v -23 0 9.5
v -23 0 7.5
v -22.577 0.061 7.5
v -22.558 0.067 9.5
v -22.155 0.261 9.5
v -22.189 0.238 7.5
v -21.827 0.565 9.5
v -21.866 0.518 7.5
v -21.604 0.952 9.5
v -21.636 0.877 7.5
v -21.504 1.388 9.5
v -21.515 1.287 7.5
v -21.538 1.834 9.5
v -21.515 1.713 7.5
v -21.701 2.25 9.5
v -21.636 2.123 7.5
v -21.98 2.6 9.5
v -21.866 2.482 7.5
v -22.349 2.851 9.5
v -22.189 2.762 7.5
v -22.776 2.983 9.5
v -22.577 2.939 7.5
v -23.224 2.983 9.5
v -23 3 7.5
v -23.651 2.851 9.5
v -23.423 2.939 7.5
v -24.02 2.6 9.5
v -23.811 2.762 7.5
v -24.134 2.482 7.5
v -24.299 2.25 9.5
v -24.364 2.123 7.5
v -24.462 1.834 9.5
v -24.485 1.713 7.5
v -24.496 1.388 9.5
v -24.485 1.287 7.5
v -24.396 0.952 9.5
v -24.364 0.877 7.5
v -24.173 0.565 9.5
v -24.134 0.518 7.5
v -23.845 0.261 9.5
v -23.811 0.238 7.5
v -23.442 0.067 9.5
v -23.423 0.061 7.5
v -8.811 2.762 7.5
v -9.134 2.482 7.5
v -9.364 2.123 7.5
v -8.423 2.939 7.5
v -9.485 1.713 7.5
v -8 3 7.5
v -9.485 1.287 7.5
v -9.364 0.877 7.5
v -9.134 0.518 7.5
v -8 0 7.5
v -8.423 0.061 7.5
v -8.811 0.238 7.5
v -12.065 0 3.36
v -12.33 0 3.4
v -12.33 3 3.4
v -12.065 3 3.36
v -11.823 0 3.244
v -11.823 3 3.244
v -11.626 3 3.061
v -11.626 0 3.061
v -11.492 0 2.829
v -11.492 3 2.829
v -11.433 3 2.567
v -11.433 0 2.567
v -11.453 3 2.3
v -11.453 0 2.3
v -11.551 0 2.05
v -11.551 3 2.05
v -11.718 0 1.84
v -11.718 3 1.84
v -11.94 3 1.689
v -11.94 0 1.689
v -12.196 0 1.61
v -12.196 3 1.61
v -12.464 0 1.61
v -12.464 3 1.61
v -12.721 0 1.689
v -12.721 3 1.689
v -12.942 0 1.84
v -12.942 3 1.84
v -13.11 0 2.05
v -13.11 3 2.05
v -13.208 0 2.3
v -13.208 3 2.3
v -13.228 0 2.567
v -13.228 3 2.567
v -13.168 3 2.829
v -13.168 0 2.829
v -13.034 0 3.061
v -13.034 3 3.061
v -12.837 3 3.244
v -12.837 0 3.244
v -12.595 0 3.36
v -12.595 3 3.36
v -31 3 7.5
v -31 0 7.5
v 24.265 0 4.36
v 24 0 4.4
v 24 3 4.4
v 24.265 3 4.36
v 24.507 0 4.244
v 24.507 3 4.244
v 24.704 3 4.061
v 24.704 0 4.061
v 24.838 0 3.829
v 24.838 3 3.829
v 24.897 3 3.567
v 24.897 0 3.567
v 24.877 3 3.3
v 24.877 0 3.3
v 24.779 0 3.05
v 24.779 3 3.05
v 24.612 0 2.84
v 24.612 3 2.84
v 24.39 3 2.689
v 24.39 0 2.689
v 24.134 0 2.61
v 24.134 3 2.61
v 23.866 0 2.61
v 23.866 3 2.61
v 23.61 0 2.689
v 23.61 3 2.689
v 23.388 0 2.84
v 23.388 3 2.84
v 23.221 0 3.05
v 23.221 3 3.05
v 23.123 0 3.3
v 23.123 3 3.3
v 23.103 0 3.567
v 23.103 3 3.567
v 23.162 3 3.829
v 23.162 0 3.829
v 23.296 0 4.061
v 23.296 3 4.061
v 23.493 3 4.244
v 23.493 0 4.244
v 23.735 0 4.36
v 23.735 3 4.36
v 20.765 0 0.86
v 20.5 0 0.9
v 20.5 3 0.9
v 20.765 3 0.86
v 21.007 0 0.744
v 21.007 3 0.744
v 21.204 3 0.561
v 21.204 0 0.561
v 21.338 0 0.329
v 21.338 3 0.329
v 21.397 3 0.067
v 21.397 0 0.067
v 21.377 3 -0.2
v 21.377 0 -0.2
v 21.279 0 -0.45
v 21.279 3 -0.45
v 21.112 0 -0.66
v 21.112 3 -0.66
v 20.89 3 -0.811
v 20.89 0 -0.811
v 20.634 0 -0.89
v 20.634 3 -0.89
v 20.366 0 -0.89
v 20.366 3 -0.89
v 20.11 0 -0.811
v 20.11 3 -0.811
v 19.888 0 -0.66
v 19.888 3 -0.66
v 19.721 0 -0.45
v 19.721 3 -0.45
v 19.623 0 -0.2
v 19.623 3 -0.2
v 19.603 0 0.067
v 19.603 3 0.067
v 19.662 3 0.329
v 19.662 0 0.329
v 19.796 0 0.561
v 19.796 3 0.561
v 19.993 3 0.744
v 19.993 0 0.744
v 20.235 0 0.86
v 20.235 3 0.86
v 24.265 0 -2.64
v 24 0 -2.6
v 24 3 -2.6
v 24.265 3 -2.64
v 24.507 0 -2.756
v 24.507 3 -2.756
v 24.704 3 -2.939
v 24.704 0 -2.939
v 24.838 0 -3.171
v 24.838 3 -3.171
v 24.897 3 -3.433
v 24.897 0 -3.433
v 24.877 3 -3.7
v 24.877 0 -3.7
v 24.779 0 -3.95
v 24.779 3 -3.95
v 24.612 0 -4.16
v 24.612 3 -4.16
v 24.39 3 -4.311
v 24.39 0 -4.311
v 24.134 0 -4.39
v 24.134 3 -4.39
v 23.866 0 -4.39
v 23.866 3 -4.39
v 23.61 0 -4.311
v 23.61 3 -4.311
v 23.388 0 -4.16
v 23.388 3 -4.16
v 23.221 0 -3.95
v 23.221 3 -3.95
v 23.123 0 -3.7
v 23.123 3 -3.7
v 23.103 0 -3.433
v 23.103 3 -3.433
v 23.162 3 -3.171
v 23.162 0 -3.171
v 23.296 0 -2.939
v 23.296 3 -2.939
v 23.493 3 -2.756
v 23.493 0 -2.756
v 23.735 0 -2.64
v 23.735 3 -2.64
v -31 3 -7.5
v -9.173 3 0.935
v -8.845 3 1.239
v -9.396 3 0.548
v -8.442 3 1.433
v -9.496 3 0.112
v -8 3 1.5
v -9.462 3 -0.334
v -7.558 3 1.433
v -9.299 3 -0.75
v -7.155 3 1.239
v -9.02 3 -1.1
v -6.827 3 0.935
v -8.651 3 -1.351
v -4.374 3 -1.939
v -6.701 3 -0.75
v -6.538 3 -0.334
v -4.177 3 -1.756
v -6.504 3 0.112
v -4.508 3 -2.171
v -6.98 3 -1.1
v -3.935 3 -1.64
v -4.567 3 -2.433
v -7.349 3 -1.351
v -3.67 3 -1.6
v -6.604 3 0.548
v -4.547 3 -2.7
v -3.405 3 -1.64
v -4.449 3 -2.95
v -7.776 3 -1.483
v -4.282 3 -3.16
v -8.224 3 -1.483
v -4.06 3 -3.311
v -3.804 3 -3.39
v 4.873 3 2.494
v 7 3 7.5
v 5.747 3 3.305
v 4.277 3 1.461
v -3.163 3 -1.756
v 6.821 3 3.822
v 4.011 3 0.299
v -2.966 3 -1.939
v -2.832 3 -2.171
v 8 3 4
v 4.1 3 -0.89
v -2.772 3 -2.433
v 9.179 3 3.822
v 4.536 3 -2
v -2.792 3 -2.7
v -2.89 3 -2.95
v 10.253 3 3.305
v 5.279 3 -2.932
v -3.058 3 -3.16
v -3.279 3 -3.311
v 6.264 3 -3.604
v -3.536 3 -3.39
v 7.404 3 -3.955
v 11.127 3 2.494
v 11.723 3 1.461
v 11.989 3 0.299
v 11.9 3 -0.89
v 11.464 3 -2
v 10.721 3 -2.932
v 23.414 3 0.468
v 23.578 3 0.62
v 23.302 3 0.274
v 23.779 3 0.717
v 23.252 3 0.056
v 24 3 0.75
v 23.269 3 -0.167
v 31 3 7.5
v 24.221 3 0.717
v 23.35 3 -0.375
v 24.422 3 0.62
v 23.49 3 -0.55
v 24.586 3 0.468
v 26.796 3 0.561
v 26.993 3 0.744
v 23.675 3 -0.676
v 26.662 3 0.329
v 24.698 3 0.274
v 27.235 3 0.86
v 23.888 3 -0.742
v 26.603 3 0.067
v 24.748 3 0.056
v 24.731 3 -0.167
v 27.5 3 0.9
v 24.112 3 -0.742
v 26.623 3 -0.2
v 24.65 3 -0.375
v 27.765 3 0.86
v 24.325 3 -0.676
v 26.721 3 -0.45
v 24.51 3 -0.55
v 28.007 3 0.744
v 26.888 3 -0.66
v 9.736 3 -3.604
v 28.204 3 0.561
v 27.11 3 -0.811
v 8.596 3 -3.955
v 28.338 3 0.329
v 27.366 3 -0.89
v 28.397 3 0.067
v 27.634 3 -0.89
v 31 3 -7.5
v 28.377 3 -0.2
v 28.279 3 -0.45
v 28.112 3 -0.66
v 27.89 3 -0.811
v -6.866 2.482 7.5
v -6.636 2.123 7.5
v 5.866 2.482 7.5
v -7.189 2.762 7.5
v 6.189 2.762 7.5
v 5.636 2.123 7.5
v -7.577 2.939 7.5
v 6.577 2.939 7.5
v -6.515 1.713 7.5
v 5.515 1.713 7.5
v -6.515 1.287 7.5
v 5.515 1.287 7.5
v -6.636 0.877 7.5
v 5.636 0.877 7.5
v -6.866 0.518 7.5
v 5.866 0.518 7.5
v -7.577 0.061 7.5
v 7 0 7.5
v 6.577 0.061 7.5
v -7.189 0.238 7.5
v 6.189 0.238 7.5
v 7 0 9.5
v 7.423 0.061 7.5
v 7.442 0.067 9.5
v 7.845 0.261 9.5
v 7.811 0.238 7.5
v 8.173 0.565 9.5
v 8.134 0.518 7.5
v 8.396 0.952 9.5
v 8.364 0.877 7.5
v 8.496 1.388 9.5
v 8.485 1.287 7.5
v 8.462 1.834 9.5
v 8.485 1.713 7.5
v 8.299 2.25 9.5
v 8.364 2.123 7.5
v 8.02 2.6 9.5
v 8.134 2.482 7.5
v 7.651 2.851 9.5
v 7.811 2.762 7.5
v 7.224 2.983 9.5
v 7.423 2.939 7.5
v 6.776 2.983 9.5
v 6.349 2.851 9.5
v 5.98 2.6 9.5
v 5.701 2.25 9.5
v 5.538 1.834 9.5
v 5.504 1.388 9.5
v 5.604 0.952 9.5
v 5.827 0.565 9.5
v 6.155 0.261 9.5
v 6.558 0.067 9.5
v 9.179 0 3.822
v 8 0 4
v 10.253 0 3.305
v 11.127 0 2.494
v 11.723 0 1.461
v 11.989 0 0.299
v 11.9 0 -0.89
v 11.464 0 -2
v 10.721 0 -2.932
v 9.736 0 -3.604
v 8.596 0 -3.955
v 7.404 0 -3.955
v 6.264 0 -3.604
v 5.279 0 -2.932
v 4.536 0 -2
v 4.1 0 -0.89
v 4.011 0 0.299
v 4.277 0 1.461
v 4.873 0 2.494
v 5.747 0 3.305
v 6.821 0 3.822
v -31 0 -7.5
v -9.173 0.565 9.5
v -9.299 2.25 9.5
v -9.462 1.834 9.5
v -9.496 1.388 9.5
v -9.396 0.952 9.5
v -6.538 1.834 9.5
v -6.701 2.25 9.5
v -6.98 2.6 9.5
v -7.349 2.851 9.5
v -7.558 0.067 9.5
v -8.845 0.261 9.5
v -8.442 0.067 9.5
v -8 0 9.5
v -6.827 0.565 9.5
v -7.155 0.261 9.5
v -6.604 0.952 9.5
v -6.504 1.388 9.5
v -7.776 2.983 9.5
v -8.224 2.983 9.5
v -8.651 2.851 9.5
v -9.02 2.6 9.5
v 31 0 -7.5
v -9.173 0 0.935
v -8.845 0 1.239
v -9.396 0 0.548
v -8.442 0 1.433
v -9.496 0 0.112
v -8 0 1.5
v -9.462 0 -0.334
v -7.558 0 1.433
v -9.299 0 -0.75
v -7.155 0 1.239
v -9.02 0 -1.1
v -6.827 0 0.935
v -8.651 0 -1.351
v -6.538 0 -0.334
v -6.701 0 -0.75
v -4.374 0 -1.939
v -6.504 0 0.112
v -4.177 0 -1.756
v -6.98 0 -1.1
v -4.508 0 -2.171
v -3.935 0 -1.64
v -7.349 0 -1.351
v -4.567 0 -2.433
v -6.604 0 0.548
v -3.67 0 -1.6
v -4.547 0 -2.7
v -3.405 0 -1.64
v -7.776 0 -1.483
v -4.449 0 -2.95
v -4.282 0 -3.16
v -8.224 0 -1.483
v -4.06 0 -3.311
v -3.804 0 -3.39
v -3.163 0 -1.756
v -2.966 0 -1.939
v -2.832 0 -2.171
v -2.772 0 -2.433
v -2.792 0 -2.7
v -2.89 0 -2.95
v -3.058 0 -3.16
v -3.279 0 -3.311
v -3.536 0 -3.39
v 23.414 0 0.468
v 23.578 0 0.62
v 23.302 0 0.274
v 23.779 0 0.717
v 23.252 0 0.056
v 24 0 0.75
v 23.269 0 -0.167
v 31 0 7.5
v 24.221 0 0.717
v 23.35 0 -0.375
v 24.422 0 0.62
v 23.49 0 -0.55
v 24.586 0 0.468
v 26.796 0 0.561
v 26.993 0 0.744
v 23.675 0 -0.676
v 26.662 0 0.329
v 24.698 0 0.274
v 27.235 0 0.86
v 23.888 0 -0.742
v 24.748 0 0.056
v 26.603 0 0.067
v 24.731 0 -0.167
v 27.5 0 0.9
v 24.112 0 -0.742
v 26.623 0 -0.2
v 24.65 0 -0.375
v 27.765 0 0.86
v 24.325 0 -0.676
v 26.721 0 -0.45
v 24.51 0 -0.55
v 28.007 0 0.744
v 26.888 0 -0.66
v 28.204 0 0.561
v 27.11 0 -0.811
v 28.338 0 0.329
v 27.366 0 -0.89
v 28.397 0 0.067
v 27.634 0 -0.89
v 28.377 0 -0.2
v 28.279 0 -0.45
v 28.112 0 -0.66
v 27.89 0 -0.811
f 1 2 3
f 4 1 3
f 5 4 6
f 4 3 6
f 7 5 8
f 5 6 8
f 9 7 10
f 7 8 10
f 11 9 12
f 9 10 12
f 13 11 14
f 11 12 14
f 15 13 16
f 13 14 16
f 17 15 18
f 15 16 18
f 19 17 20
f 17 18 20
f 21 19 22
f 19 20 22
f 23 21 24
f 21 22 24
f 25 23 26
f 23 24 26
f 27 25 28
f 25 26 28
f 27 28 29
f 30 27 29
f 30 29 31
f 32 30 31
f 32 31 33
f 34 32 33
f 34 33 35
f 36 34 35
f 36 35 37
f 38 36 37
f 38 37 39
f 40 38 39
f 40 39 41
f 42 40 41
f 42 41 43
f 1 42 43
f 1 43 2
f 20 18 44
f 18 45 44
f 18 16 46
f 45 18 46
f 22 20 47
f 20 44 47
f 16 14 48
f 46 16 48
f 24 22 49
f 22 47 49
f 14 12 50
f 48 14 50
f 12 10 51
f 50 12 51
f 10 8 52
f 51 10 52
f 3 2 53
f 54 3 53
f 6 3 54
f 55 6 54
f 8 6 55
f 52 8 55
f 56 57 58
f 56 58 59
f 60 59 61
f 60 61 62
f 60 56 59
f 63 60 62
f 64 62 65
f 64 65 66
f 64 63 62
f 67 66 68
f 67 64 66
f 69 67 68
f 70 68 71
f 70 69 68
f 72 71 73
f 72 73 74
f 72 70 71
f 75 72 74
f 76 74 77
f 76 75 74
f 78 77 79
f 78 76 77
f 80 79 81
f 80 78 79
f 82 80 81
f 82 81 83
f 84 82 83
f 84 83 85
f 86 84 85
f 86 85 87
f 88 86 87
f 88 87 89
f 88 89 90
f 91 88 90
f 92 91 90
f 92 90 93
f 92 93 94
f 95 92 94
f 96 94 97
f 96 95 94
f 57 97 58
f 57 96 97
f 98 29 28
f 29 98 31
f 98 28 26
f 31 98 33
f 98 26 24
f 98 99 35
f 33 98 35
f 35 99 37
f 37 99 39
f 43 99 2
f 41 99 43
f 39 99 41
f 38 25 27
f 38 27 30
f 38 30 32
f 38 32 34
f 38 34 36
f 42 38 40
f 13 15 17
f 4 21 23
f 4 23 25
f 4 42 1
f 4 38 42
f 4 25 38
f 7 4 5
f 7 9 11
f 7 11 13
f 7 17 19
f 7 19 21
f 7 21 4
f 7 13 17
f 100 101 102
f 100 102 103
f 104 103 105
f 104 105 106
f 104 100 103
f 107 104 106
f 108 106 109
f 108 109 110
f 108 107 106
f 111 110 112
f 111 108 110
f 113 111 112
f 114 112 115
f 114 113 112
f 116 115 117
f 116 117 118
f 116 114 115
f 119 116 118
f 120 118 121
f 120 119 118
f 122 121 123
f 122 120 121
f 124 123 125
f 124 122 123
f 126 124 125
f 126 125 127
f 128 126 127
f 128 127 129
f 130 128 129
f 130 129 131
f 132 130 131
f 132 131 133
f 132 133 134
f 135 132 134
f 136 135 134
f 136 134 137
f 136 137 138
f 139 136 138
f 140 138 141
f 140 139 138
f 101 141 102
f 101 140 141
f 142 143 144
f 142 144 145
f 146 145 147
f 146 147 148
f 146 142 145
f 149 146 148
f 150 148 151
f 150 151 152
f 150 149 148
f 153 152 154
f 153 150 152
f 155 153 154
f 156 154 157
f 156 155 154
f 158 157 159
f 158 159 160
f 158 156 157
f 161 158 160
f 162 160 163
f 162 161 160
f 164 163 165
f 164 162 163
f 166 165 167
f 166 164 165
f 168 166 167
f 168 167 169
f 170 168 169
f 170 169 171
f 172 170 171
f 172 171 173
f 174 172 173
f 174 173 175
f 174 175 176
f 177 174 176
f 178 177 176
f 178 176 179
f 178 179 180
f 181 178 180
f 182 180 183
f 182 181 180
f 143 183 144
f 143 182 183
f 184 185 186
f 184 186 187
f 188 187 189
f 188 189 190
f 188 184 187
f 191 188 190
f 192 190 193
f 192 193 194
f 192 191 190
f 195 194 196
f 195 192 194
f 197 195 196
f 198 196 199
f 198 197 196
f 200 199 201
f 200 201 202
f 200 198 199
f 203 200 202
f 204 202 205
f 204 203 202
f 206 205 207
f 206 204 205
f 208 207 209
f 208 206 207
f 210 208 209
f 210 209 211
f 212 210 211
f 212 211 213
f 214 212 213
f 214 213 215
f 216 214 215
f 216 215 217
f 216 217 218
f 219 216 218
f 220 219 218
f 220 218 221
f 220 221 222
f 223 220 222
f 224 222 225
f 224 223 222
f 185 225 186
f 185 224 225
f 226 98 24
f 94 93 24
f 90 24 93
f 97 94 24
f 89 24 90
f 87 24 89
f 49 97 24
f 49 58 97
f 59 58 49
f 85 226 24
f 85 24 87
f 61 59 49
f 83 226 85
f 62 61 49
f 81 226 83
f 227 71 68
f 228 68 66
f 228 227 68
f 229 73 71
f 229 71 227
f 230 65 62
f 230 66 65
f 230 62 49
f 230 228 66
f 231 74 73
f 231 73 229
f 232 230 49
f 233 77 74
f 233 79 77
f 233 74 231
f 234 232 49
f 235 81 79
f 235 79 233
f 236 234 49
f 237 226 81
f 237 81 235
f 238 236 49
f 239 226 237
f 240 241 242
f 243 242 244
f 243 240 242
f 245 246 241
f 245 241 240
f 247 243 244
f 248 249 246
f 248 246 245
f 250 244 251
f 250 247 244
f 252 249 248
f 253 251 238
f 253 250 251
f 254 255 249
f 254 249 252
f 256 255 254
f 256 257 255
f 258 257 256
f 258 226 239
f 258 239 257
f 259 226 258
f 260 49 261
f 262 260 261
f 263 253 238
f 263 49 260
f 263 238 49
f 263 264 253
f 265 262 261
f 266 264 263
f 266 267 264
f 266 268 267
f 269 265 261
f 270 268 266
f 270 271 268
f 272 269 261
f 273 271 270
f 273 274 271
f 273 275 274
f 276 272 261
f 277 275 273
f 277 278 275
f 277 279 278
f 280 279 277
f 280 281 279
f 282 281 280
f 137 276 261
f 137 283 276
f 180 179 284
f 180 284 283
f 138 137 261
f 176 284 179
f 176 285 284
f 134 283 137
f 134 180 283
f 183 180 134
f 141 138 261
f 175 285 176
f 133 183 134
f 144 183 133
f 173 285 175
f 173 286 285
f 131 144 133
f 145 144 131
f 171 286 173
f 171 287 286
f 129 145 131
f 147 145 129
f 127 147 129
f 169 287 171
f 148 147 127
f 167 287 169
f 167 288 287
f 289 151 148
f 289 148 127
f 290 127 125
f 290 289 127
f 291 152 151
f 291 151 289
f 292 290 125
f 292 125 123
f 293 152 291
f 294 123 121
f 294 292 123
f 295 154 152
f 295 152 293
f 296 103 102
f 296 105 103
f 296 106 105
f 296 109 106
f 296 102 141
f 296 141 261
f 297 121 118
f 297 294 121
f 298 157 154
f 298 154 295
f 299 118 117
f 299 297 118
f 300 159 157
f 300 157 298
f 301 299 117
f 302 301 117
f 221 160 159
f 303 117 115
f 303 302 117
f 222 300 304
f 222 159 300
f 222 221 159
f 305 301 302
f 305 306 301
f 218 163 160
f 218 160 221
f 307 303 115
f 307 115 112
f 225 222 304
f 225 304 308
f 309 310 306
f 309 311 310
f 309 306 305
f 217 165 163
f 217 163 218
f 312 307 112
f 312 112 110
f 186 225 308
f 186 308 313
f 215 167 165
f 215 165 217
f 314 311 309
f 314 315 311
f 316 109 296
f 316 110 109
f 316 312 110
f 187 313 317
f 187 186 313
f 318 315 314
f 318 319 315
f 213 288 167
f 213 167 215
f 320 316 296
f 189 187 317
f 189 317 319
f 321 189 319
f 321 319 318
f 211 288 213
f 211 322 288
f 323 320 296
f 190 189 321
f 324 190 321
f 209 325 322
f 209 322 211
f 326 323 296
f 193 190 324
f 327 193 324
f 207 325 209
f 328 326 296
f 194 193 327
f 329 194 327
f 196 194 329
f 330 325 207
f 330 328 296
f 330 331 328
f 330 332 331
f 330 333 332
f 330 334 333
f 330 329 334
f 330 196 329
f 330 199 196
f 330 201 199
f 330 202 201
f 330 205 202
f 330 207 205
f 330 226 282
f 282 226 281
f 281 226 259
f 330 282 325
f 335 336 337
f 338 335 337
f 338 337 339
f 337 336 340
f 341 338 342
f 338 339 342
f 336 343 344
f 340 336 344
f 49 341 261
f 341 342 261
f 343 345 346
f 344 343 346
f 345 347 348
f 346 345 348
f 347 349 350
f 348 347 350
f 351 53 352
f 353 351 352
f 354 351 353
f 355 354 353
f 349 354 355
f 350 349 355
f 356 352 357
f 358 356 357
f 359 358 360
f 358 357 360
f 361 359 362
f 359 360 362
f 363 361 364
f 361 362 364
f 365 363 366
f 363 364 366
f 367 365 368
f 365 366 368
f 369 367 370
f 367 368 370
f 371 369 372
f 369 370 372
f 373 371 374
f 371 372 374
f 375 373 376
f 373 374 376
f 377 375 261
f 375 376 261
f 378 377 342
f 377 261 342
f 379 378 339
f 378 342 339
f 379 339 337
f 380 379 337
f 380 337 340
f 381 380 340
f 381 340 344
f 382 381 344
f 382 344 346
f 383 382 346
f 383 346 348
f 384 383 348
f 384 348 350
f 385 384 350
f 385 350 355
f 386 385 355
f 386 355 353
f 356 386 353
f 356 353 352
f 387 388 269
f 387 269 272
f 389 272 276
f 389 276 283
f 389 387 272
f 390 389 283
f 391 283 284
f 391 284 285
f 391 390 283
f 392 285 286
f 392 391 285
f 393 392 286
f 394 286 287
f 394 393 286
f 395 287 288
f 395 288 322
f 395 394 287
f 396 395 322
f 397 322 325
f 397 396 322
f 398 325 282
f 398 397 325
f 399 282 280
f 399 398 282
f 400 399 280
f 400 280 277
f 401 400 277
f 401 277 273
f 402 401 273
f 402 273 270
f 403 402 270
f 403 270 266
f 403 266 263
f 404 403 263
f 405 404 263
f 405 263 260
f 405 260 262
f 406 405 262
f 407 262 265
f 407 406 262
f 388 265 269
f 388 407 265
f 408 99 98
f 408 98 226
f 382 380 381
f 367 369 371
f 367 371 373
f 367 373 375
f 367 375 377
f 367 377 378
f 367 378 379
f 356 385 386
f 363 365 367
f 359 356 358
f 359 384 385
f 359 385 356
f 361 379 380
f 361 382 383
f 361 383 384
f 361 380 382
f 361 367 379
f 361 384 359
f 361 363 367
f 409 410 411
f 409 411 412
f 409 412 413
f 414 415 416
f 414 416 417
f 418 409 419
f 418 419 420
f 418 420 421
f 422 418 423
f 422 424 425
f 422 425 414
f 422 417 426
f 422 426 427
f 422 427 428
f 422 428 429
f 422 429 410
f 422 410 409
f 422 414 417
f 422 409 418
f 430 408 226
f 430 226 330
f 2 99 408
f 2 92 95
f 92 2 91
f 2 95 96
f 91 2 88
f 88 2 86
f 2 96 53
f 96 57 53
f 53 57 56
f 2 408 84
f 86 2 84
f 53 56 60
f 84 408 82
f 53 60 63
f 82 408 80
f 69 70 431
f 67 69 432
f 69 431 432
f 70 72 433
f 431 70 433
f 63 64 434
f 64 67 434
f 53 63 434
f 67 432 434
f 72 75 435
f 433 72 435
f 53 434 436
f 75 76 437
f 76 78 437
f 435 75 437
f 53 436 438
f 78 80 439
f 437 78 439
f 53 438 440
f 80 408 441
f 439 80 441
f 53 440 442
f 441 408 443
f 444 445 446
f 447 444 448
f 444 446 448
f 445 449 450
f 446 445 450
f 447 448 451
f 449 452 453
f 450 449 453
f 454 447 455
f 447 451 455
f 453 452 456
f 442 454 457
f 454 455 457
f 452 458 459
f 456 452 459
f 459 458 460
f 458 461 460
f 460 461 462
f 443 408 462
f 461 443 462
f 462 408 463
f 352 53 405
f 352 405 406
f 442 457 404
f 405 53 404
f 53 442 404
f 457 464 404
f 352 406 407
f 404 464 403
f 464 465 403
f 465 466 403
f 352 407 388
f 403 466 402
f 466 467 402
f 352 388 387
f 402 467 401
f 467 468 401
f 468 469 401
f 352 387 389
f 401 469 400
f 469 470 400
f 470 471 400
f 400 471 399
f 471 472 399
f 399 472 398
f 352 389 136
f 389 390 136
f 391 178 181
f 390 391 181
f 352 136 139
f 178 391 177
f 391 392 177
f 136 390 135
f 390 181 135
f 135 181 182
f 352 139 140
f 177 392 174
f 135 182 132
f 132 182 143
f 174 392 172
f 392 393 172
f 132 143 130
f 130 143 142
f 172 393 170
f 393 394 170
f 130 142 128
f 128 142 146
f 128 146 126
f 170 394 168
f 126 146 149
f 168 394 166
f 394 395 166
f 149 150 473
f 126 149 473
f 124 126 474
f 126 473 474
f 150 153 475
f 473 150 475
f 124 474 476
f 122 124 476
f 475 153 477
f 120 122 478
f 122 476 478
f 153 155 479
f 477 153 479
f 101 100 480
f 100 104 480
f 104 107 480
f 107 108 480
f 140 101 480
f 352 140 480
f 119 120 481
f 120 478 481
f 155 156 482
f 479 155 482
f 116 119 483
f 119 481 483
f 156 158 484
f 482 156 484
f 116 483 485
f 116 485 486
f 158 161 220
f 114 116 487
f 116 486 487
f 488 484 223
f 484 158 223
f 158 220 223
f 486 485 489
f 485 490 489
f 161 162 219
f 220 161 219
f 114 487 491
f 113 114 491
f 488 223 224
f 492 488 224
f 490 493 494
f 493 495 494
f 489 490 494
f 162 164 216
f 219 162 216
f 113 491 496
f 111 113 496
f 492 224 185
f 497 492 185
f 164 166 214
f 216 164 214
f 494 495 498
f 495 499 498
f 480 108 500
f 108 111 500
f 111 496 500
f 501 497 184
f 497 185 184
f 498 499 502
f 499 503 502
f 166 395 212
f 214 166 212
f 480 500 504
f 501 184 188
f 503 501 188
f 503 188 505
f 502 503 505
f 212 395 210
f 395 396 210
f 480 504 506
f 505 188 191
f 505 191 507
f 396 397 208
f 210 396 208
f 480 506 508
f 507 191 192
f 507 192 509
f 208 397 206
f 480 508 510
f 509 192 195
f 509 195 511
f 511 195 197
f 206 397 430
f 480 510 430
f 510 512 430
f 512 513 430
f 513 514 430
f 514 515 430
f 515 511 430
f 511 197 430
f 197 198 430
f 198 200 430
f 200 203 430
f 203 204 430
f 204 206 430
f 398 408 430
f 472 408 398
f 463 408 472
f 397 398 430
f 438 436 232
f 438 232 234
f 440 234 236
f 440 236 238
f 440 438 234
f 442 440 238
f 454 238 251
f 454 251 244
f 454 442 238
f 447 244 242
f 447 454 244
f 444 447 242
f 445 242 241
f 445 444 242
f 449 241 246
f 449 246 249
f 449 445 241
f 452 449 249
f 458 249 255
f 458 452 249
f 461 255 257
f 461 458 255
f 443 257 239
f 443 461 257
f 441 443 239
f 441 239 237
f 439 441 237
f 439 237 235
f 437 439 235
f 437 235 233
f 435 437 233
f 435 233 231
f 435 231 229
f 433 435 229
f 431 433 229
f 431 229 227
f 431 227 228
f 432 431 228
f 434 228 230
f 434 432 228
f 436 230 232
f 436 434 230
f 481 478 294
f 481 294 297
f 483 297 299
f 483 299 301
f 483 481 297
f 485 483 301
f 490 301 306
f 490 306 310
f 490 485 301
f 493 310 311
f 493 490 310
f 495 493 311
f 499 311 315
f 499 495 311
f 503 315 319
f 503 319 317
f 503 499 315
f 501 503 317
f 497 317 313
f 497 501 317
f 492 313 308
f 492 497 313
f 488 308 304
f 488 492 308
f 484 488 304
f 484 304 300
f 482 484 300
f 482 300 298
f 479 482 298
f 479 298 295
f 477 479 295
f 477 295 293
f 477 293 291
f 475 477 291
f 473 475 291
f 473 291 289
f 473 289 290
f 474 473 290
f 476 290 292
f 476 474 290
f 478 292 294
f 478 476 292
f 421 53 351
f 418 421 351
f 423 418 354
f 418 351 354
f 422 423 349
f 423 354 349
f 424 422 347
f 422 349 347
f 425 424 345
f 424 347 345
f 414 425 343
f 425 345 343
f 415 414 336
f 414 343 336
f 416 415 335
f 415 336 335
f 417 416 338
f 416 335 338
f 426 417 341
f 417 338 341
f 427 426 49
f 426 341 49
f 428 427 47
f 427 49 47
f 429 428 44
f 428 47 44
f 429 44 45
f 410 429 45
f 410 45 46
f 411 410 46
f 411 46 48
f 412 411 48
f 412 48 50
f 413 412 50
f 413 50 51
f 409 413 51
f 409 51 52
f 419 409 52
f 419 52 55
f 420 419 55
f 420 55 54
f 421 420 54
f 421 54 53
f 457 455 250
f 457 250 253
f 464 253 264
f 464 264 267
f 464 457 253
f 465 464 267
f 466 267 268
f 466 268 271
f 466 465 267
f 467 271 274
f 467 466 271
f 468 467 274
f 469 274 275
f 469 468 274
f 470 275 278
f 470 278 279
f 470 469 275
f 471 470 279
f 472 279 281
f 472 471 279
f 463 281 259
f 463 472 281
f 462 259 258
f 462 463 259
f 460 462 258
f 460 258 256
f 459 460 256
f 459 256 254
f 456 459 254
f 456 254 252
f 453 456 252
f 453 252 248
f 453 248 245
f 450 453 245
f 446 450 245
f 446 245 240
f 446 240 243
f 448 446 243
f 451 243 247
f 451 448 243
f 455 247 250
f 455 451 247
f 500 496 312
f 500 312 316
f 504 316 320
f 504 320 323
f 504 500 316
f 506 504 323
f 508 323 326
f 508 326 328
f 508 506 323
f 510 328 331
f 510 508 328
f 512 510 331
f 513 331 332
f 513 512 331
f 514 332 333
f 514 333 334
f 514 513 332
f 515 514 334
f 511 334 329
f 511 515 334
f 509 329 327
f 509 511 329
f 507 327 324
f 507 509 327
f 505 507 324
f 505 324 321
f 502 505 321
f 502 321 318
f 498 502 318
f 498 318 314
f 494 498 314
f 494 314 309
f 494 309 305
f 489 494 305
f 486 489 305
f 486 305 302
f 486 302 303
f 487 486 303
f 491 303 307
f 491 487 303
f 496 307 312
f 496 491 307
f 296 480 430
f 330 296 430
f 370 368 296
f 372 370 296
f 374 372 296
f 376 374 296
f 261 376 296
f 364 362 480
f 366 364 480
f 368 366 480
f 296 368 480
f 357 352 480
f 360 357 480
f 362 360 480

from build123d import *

# Parameters (mm, degrees)
SKETCH_1_W      = 62
SKETCH_1_H      = 15
SKETCH_1_R      = 1.5
SKETCH_1_R_2    = 0.9
SKETCH_1_R_3    = 4
SKETCH_1_R_4    = 0.75
EXTRUDE_1_DEPTH = 3
SKETCH_2_R      = 1.5
EXTRUDE_2_DEPTH = 2


with BuildPart() as part:
    # 草图1 → 凸台-拉伸1 (new body)
    with BuildSketch(Plane(origin=(0, 0, 0), x_dir=(1, 0, 0), z_dir=(0, 1, 0))):
        Rectangle(SKETCH_1_W, SKETCH_1_H)
        with Locations(Location((-8, 0, 0), (0, 0, 270))):
            Circle(SKETCH_1_R, mode=Mode.SUBTRACT)
        with Locations(Location((-3.669872981, 2.5, 0), (0, 0, 270))):
            Circle(SKETCH_1_R_2, mode=Mode.SUBTRACT)
        with Locations(Location((-12.330127019, -2.5, 0), (0, 0, 270))):
            Circle(SKETCH_1_R_2, mode=Mode.SUBTRACT)
        with Locations(Location((8, 0, 0), (0, 0, 270))):
            Circle(SKETCH_1_R_3, mode=Mode.SUBTRACT)
        with Locations(Location((24, 0, 0), (0, 0, 270))):
            Circle(SKETCH_1_R_4, mode=Mode.SUBTRACT)
        with Locations(Location((27.5, 0, 0), (0, 0, 270))):
            Circle(SKETCH_1_R_2, mode=Mode.SUBTRACT)
        with Locations(Location((24, -3.5, 0), (0, 0, 270))):
            Circle(SKETCH_1_R_2, mode=Mode.SUBTRACT)
        with Locations(Location((20.5, 0, 0), (0, 0, 270))):
            Circle(SKETCH_1_R_2, mode=Mode.SUBTRACT)
        with Locations(Location((24, 3.5, 0), (0, 0, 270))):
            Circle(SKETCH_1_R_2, mode=Mode.SUBTRACT)
    extrude(amount=EXTRUDE_1_DEPTH)

    # 草图2 → 凸台-拉伸2 (add)
    with BuildSketch(Plane.XY.offset(7.5)):
        with Locations(Location((-23, 1.5, 0), (0, 0, 270))):
            Circle(SKETCH_2_R)
        with Locations(Location((-8, 1.5, 0), (0, 0, 270))):
            Circle(SKETCH_2_R)
        with Locations(Location((7, 1.5, 0), (0, 0, 270))):
            Circle(SKETCH_2_R)
    extrude(amount=EXTRUDE_2_DEPTH)


solid = part.part
